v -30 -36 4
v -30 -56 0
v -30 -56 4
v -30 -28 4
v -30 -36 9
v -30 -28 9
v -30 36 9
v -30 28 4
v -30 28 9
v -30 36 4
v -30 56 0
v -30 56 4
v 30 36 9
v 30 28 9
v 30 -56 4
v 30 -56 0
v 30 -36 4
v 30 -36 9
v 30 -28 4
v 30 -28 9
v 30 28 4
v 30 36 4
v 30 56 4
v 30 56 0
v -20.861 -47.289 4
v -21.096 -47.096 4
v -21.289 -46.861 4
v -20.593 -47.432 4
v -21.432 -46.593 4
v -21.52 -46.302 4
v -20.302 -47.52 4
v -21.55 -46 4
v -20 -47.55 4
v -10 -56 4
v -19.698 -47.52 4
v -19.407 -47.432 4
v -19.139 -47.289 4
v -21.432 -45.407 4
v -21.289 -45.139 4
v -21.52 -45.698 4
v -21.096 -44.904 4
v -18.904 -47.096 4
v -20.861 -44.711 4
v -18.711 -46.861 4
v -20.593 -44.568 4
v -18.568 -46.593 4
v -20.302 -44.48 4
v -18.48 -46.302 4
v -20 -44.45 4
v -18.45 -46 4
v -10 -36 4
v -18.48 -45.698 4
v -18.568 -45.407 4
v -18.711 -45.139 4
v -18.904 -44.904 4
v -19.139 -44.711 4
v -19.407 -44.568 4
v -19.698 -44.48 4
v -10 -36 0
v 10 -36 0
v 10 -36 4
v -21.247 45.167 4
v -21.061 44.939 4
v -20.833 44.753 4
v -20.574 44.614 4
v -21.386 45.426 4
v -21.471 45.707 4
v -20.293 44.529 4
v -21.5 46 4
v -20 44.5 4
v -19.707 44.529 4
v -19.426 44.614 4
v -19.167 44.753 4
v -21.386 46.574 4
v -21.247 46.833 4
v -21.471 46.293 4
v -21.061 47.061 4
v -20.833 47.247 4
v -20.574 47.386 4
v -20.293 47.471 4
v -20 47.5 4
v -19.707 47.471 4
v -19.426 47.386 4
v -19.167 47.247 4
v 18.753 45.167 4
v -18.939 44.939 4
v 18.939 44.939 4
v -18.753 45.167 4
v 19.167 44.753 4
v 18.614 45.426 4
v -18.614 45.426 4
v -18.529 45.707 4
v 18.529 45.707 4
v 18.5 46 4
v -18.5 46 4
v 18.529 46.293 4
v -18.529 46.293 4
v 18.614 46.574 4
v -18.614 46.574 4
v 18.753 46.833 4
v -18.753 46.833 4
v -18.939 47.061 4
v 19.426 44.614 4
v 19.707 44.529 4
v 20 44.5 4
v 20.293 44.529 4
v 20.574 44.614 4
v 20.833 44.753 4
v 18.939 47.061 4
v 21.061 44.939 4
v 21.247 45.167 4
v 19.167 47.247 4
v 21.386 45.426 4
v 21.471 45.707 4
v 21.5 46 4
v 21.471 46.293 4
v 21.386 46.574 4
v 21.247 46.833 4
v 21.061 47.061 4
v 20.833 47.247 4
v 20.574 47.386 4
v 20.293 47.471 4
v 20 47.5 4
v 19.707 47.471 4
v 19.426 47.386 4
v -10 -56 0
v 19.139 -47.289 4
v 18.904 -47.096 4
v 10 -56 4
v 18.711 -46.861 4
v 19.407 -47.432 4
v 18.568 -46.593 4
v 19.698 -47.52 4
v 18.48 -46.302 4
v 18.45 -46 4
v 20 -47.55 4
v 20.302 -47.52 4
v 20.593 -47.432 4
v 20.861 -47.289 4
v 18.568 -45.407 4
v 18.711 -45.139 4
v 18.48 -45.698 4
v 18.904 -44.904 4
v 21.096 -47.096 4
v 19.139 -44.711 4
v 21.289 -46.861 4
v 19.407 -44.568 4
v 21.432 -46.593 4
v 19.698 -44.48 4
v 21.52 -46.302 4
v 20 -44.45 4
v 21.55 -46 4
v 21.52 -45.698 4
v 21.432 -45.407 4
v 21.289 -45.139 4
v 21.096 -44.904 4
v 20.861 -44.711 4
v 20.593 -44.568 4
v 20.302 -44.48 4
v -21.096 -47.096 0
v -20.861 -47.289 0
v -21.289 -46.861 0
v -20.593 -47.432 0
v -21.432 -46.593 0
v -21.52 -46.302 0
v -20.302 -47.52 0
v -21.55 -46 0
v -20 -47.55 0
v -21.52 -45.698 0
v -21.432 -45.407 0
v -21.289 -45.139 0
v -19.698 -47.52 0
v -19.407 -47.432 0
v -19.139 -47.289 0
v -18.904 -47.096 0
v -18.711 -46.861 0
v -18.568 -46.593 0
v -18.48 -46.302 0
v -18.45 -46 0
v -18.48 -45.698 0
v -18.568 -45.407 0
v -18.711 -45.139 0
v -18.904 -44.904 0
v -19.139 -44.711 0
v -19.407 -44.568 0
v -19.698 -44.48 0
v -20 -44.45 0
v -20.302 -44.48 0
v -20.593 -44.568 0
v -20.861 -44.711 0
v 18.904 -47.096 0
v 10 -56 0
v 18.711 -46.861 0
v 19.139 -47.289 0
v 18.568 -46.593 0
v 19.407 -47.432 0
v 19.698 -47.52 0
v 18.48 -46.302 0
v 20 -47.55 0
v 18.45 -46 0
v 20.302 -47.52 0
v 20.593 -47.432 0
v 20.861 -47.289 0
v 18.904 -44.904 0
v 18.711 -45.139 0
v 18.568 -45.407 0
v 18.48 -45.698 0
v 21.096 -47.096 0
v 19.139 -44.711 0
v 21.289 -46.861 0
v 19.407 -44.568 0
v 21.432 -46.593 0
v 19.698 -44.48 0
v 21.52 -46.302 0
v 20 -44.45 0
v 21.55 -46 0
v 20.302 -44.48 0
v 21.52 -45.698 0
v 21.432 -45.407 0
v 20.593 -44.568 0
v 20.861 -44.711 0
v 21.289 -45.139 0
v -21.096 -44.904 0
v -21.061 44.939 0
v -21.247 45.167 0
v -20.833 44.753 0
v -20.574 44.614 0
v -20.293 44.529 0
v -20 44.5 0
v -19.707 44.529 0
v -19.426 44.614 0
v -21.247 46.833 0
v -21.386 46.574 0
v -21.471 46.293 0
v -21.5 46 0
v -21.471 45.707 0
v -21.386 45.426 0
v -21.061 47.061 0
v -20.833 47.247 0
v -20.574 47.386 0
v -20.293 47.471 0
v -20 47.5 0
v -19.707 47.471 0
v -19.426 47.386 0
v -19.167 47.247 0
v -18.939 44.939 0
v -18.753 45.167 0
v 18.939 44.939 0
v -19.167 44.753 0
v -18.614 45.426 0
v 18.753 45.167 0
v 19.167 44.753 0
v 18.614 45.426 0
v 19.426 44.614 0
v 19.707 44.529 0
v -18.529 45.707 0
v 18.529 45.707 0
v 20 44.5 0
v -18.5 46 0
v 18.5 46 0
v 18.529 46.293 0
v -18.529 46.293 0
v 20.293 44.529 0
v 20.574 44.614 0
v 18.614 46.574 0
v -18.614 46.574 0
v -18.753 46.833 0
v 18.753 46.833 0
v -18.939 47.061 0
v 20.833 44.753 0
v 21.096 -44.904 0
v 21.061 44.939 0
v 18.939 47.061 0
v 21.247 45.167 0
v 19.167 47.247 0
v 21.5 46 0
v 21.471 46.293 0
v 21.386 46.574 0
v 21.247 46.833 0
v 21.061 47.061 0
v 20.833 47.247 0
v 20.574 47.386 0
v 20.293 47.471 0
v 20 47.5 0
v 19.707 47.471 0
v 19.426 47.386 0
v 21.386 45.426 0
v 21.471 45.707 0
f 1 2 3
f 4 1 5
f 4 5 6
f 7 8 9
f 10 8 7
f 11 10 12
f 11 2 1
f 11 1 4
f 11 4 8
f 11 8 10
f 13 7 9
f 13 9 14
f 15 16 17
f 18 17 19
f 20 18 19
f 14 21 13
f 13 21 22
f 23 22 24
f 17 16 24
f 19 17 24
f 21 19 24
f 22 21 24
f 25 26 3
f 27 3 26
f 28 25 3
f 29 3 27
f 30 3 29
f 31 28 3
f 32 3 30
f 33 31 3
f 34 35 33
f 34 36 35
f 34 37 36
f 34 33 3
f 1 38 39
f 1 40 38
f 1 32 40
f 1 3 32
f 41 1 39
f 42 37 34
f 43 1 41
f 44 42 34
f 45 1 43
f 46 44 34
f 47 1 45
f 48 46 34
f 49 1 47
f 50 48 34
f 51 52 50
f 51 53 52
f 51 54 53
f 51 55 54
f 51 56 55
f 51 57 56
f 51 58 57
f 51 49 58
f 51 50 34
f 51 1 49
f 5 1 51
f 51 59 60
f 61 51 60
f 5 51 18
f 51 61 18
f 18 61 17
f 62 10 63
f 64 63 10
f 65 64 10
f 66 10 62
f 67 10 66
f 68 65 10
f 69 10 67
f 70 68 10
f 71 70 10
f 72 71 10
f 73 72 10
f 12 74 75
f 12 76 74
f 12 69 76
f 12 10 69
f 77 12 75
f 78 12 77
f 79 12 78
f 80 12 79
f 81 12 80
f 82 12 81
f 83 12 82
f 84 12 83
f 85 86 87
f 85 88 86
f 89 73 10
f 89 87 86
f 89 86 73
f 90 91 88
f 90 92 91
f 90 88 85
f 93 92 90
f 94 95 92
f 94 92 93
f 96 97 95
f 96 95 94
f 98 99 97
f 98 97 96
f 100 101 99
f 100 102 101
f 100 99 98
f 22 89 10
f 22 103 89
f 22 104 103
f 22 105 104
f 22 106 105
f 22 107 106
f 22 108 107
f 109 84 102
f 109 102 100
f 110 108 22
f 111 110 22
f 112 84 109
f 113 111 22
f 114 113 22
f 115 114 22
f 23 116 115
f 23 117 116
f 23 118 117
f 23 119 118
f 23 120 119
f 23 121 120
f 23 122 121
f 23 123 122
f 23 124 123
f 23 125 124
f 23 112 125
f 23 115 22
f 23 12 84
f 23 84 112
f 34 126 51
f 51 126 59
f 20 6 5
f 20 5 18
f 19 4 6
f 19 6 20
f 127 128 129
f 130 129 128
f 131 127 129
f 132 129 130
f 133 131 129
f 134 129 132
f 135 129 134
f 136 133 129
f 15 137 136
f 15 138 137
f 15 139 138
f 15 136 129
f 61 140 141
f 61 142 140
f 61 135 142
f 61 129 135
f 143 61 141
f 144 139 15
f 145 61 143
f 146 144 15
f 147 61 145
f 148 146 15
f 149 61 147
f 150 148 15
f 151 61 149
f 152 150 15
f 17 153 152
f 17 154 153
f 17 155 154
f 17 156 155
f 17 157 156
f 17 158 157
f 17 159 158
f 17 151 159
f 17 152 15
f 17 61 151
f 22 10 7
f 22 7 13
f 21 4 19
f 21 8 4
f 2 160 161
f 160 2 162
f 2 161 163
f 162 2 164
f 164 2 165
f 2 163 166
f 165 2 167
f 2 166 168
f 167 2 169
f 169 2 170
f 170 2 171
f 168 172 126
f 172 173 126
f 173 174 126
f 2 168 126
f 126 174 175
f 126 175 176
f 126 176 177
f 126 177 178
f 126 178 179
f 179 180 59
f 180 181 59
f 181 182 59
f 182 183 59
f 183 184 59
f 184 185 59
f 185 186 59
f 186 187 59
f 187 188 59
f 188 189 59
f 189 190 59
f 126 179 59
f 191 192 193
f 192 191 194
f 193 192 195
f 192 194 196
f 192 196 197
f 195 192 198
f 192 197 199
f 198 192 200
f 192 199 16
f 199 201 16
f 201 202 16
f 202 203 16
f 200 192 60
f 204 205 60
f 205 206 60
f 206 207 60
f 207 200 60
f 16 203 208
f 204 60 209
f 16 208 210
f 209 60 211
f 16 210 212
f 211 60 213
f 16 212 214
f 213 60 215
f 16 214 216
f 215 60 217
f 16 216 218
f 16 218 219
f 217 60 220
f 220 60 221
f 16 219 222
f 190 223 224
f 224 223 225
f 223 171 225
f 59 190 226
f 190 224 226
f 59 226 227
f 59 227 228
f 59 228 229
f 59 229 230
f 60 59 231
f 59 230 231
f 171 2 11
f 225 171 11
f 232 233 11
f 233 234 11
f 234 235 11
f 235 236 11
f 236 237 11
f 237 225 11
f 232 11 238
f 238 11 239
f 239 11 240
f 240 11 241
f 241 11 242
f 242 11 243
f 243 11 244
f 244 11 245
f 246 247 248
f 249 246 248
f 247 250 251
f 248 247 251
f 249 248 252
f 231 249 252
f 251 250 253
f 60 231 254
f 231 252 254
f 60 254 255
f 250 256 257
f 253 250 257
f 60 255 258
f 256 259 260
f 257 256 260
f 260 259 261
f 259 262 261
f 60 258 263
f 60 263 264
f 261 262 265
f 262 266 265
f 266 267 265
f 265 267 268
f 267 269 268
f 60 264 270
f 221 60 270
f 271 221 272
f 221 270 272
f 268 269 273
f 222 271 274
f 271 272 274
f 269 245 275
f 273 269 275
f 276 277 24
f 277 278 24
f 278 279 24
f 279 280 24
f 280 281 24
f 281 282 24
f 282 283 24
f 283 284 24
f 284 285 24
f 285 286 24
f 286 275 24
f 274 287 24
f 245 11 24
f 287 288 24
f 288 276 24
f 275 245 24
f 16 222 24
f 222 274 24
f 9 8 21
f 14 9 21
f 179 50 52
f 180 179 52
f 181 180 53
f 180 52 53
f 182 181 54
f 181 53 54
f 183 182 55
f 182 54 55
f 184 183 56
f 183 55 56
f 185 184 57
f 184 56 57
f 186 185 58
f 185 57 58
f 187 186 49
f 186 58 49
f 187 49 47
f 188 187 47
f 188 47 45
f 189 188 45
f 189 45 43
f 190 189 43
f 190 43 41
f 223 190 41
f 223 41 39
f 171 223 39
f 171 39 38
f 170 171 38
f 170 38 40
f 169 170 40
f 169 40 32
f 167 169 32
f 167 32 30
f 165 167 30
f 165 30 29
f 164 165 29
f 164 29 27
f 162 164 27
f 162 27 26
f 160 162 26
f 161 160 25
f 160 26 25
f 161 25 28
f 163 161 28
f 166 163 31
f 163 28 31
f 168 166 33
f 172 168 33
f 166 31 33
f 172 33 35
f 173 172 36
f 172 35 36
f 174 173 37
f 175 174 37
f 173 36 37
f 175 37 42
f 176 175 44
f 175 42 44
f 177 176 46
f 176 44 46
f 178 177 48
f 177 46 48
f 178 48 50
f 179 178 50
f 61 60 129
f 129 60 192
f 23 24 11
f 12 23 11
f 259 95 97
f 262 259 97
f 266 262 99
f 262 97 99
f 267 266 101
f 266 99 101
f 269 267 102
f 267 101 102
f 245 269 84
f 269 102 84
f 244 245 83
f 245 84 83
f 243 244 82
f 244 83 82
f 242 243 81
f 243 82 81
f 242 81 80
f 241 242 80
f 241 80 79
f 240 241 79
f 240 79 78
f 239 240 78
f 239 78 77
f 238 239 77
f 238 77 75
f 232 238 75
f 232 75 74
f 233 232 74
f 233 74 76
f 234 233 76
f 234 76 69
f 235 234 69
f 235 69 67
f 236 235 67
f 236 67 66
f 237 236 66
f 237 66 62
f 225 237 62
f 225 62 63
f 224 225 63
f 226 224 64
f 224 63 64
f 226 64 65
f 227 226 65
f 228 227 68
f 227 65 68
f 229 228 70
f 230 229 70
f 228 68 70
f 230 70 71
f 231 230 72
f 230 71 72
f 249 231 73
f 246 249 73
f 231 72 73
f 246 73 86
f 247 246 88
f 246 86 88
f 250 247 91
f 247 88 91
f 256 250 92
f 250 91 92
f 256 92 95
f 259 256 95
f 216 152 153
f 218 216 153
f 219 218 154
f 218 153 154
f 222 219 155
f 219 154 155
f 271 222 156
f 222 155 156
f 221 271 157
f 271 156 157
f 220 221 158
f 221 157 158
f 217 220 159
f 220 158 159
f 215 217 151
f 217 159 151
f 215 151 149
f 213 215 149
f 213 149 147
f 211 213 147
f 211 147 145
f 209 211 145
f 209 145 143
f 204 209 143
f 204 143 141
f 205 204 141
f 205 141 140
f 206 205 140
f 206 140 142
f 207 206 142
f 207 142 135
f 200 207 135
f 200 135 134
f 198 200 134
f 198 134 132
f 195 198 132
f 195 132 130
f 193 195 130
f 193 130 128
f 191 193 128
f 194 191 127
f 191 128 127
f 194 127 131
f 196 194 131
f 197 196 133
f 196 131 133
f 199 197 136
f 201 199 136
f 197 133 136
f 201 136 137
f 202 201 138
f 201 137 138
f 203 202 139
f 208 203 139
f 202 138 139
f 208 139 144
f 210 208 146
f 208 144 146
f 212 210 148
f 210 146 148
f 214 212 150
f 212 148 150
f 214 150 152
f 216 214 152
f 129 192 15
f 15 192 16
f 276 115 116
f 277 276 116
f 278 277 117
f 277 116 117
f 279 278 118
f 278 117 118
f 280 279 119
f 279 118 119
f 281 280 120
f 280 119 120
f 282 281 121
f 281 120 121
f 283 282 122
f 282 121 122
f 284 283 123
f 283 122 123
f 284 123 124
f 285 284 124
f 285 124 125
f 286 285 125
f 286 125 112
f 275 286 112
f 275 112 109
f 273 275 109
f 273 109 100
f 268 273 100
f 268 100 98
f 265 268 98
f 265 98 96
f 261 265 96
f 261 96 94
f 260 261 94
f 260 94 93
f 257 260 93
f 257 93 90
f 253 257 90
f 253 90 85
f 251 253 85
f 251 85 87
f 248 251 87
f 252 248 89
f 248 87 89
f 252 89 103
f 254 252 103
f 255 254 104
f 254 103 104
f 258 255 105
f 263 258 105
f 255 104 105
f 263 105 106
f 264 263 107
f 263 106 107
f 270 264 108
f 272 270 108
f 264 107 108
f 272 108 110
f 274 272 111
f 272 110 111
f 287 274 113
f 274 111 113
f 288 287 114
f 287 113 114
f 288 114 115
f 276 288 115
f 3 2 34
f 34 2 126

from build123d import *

# Parameters (mm, degrees)
SALIENTE_EXTRUIR1_DEPTH = 4
CROQUIS2_W              = 60
CROQUIS2_H              = 8
SALIENTE_EXTRUIR2_DEPTH = 5
CROQUIS3_R              = 1.55
CROQUIS3_R_2            = 1.5
CORTAR_EXTRUIR1_DEPTH   = 64.725975865


with BuildPart() as part:
    # Croquis1 → Saliente-Extruir1 (new body)
    with BuildSketch(Plane.XY):
        Polygon((10, -36), (10, -56), (30, -56), (30, 56), (-30, 56), (-30, -56), (-10, -56), (-10, -36), align=None)
    extrude(amount=SALIENTE_EXTRUIR1_DEPTH)

    # Croquis2 → Saliente-Extruir2 (add)
    with BuildSketch(Plane.XY.offset(4)):
        with Locations((0, 32)):
            Rectangle(CROQUIS2_W, CROQUIS2_H)
        with Locations((0, -32)):
            Rectangle(CROQUIS2_W, CROQUIS2_H)
    extrude(amount=SALIENTE_EXTRUIR2_DEPTH)

    # Croquis3 → Cortar-Extruir1 (cut, through all)
    with BuildSketch(Plane.XY.offset(4)):
        with Locations((-20, -46)):
            Circle(CROQUIS3_R)
        with Locations((20, -46)):
            Circle(CROQUIS3_R)
        with Locations((-20, 46)):
            Circle(CROQUIS3_R_2)
        with Locations((20, 46)):
            Circle(CROQUIS3_R_2)
    extrude(amount=-CORTAR_EXTRUIR1_DEPTH, mode=Mode.SUBTRACT)


solid = part.part
